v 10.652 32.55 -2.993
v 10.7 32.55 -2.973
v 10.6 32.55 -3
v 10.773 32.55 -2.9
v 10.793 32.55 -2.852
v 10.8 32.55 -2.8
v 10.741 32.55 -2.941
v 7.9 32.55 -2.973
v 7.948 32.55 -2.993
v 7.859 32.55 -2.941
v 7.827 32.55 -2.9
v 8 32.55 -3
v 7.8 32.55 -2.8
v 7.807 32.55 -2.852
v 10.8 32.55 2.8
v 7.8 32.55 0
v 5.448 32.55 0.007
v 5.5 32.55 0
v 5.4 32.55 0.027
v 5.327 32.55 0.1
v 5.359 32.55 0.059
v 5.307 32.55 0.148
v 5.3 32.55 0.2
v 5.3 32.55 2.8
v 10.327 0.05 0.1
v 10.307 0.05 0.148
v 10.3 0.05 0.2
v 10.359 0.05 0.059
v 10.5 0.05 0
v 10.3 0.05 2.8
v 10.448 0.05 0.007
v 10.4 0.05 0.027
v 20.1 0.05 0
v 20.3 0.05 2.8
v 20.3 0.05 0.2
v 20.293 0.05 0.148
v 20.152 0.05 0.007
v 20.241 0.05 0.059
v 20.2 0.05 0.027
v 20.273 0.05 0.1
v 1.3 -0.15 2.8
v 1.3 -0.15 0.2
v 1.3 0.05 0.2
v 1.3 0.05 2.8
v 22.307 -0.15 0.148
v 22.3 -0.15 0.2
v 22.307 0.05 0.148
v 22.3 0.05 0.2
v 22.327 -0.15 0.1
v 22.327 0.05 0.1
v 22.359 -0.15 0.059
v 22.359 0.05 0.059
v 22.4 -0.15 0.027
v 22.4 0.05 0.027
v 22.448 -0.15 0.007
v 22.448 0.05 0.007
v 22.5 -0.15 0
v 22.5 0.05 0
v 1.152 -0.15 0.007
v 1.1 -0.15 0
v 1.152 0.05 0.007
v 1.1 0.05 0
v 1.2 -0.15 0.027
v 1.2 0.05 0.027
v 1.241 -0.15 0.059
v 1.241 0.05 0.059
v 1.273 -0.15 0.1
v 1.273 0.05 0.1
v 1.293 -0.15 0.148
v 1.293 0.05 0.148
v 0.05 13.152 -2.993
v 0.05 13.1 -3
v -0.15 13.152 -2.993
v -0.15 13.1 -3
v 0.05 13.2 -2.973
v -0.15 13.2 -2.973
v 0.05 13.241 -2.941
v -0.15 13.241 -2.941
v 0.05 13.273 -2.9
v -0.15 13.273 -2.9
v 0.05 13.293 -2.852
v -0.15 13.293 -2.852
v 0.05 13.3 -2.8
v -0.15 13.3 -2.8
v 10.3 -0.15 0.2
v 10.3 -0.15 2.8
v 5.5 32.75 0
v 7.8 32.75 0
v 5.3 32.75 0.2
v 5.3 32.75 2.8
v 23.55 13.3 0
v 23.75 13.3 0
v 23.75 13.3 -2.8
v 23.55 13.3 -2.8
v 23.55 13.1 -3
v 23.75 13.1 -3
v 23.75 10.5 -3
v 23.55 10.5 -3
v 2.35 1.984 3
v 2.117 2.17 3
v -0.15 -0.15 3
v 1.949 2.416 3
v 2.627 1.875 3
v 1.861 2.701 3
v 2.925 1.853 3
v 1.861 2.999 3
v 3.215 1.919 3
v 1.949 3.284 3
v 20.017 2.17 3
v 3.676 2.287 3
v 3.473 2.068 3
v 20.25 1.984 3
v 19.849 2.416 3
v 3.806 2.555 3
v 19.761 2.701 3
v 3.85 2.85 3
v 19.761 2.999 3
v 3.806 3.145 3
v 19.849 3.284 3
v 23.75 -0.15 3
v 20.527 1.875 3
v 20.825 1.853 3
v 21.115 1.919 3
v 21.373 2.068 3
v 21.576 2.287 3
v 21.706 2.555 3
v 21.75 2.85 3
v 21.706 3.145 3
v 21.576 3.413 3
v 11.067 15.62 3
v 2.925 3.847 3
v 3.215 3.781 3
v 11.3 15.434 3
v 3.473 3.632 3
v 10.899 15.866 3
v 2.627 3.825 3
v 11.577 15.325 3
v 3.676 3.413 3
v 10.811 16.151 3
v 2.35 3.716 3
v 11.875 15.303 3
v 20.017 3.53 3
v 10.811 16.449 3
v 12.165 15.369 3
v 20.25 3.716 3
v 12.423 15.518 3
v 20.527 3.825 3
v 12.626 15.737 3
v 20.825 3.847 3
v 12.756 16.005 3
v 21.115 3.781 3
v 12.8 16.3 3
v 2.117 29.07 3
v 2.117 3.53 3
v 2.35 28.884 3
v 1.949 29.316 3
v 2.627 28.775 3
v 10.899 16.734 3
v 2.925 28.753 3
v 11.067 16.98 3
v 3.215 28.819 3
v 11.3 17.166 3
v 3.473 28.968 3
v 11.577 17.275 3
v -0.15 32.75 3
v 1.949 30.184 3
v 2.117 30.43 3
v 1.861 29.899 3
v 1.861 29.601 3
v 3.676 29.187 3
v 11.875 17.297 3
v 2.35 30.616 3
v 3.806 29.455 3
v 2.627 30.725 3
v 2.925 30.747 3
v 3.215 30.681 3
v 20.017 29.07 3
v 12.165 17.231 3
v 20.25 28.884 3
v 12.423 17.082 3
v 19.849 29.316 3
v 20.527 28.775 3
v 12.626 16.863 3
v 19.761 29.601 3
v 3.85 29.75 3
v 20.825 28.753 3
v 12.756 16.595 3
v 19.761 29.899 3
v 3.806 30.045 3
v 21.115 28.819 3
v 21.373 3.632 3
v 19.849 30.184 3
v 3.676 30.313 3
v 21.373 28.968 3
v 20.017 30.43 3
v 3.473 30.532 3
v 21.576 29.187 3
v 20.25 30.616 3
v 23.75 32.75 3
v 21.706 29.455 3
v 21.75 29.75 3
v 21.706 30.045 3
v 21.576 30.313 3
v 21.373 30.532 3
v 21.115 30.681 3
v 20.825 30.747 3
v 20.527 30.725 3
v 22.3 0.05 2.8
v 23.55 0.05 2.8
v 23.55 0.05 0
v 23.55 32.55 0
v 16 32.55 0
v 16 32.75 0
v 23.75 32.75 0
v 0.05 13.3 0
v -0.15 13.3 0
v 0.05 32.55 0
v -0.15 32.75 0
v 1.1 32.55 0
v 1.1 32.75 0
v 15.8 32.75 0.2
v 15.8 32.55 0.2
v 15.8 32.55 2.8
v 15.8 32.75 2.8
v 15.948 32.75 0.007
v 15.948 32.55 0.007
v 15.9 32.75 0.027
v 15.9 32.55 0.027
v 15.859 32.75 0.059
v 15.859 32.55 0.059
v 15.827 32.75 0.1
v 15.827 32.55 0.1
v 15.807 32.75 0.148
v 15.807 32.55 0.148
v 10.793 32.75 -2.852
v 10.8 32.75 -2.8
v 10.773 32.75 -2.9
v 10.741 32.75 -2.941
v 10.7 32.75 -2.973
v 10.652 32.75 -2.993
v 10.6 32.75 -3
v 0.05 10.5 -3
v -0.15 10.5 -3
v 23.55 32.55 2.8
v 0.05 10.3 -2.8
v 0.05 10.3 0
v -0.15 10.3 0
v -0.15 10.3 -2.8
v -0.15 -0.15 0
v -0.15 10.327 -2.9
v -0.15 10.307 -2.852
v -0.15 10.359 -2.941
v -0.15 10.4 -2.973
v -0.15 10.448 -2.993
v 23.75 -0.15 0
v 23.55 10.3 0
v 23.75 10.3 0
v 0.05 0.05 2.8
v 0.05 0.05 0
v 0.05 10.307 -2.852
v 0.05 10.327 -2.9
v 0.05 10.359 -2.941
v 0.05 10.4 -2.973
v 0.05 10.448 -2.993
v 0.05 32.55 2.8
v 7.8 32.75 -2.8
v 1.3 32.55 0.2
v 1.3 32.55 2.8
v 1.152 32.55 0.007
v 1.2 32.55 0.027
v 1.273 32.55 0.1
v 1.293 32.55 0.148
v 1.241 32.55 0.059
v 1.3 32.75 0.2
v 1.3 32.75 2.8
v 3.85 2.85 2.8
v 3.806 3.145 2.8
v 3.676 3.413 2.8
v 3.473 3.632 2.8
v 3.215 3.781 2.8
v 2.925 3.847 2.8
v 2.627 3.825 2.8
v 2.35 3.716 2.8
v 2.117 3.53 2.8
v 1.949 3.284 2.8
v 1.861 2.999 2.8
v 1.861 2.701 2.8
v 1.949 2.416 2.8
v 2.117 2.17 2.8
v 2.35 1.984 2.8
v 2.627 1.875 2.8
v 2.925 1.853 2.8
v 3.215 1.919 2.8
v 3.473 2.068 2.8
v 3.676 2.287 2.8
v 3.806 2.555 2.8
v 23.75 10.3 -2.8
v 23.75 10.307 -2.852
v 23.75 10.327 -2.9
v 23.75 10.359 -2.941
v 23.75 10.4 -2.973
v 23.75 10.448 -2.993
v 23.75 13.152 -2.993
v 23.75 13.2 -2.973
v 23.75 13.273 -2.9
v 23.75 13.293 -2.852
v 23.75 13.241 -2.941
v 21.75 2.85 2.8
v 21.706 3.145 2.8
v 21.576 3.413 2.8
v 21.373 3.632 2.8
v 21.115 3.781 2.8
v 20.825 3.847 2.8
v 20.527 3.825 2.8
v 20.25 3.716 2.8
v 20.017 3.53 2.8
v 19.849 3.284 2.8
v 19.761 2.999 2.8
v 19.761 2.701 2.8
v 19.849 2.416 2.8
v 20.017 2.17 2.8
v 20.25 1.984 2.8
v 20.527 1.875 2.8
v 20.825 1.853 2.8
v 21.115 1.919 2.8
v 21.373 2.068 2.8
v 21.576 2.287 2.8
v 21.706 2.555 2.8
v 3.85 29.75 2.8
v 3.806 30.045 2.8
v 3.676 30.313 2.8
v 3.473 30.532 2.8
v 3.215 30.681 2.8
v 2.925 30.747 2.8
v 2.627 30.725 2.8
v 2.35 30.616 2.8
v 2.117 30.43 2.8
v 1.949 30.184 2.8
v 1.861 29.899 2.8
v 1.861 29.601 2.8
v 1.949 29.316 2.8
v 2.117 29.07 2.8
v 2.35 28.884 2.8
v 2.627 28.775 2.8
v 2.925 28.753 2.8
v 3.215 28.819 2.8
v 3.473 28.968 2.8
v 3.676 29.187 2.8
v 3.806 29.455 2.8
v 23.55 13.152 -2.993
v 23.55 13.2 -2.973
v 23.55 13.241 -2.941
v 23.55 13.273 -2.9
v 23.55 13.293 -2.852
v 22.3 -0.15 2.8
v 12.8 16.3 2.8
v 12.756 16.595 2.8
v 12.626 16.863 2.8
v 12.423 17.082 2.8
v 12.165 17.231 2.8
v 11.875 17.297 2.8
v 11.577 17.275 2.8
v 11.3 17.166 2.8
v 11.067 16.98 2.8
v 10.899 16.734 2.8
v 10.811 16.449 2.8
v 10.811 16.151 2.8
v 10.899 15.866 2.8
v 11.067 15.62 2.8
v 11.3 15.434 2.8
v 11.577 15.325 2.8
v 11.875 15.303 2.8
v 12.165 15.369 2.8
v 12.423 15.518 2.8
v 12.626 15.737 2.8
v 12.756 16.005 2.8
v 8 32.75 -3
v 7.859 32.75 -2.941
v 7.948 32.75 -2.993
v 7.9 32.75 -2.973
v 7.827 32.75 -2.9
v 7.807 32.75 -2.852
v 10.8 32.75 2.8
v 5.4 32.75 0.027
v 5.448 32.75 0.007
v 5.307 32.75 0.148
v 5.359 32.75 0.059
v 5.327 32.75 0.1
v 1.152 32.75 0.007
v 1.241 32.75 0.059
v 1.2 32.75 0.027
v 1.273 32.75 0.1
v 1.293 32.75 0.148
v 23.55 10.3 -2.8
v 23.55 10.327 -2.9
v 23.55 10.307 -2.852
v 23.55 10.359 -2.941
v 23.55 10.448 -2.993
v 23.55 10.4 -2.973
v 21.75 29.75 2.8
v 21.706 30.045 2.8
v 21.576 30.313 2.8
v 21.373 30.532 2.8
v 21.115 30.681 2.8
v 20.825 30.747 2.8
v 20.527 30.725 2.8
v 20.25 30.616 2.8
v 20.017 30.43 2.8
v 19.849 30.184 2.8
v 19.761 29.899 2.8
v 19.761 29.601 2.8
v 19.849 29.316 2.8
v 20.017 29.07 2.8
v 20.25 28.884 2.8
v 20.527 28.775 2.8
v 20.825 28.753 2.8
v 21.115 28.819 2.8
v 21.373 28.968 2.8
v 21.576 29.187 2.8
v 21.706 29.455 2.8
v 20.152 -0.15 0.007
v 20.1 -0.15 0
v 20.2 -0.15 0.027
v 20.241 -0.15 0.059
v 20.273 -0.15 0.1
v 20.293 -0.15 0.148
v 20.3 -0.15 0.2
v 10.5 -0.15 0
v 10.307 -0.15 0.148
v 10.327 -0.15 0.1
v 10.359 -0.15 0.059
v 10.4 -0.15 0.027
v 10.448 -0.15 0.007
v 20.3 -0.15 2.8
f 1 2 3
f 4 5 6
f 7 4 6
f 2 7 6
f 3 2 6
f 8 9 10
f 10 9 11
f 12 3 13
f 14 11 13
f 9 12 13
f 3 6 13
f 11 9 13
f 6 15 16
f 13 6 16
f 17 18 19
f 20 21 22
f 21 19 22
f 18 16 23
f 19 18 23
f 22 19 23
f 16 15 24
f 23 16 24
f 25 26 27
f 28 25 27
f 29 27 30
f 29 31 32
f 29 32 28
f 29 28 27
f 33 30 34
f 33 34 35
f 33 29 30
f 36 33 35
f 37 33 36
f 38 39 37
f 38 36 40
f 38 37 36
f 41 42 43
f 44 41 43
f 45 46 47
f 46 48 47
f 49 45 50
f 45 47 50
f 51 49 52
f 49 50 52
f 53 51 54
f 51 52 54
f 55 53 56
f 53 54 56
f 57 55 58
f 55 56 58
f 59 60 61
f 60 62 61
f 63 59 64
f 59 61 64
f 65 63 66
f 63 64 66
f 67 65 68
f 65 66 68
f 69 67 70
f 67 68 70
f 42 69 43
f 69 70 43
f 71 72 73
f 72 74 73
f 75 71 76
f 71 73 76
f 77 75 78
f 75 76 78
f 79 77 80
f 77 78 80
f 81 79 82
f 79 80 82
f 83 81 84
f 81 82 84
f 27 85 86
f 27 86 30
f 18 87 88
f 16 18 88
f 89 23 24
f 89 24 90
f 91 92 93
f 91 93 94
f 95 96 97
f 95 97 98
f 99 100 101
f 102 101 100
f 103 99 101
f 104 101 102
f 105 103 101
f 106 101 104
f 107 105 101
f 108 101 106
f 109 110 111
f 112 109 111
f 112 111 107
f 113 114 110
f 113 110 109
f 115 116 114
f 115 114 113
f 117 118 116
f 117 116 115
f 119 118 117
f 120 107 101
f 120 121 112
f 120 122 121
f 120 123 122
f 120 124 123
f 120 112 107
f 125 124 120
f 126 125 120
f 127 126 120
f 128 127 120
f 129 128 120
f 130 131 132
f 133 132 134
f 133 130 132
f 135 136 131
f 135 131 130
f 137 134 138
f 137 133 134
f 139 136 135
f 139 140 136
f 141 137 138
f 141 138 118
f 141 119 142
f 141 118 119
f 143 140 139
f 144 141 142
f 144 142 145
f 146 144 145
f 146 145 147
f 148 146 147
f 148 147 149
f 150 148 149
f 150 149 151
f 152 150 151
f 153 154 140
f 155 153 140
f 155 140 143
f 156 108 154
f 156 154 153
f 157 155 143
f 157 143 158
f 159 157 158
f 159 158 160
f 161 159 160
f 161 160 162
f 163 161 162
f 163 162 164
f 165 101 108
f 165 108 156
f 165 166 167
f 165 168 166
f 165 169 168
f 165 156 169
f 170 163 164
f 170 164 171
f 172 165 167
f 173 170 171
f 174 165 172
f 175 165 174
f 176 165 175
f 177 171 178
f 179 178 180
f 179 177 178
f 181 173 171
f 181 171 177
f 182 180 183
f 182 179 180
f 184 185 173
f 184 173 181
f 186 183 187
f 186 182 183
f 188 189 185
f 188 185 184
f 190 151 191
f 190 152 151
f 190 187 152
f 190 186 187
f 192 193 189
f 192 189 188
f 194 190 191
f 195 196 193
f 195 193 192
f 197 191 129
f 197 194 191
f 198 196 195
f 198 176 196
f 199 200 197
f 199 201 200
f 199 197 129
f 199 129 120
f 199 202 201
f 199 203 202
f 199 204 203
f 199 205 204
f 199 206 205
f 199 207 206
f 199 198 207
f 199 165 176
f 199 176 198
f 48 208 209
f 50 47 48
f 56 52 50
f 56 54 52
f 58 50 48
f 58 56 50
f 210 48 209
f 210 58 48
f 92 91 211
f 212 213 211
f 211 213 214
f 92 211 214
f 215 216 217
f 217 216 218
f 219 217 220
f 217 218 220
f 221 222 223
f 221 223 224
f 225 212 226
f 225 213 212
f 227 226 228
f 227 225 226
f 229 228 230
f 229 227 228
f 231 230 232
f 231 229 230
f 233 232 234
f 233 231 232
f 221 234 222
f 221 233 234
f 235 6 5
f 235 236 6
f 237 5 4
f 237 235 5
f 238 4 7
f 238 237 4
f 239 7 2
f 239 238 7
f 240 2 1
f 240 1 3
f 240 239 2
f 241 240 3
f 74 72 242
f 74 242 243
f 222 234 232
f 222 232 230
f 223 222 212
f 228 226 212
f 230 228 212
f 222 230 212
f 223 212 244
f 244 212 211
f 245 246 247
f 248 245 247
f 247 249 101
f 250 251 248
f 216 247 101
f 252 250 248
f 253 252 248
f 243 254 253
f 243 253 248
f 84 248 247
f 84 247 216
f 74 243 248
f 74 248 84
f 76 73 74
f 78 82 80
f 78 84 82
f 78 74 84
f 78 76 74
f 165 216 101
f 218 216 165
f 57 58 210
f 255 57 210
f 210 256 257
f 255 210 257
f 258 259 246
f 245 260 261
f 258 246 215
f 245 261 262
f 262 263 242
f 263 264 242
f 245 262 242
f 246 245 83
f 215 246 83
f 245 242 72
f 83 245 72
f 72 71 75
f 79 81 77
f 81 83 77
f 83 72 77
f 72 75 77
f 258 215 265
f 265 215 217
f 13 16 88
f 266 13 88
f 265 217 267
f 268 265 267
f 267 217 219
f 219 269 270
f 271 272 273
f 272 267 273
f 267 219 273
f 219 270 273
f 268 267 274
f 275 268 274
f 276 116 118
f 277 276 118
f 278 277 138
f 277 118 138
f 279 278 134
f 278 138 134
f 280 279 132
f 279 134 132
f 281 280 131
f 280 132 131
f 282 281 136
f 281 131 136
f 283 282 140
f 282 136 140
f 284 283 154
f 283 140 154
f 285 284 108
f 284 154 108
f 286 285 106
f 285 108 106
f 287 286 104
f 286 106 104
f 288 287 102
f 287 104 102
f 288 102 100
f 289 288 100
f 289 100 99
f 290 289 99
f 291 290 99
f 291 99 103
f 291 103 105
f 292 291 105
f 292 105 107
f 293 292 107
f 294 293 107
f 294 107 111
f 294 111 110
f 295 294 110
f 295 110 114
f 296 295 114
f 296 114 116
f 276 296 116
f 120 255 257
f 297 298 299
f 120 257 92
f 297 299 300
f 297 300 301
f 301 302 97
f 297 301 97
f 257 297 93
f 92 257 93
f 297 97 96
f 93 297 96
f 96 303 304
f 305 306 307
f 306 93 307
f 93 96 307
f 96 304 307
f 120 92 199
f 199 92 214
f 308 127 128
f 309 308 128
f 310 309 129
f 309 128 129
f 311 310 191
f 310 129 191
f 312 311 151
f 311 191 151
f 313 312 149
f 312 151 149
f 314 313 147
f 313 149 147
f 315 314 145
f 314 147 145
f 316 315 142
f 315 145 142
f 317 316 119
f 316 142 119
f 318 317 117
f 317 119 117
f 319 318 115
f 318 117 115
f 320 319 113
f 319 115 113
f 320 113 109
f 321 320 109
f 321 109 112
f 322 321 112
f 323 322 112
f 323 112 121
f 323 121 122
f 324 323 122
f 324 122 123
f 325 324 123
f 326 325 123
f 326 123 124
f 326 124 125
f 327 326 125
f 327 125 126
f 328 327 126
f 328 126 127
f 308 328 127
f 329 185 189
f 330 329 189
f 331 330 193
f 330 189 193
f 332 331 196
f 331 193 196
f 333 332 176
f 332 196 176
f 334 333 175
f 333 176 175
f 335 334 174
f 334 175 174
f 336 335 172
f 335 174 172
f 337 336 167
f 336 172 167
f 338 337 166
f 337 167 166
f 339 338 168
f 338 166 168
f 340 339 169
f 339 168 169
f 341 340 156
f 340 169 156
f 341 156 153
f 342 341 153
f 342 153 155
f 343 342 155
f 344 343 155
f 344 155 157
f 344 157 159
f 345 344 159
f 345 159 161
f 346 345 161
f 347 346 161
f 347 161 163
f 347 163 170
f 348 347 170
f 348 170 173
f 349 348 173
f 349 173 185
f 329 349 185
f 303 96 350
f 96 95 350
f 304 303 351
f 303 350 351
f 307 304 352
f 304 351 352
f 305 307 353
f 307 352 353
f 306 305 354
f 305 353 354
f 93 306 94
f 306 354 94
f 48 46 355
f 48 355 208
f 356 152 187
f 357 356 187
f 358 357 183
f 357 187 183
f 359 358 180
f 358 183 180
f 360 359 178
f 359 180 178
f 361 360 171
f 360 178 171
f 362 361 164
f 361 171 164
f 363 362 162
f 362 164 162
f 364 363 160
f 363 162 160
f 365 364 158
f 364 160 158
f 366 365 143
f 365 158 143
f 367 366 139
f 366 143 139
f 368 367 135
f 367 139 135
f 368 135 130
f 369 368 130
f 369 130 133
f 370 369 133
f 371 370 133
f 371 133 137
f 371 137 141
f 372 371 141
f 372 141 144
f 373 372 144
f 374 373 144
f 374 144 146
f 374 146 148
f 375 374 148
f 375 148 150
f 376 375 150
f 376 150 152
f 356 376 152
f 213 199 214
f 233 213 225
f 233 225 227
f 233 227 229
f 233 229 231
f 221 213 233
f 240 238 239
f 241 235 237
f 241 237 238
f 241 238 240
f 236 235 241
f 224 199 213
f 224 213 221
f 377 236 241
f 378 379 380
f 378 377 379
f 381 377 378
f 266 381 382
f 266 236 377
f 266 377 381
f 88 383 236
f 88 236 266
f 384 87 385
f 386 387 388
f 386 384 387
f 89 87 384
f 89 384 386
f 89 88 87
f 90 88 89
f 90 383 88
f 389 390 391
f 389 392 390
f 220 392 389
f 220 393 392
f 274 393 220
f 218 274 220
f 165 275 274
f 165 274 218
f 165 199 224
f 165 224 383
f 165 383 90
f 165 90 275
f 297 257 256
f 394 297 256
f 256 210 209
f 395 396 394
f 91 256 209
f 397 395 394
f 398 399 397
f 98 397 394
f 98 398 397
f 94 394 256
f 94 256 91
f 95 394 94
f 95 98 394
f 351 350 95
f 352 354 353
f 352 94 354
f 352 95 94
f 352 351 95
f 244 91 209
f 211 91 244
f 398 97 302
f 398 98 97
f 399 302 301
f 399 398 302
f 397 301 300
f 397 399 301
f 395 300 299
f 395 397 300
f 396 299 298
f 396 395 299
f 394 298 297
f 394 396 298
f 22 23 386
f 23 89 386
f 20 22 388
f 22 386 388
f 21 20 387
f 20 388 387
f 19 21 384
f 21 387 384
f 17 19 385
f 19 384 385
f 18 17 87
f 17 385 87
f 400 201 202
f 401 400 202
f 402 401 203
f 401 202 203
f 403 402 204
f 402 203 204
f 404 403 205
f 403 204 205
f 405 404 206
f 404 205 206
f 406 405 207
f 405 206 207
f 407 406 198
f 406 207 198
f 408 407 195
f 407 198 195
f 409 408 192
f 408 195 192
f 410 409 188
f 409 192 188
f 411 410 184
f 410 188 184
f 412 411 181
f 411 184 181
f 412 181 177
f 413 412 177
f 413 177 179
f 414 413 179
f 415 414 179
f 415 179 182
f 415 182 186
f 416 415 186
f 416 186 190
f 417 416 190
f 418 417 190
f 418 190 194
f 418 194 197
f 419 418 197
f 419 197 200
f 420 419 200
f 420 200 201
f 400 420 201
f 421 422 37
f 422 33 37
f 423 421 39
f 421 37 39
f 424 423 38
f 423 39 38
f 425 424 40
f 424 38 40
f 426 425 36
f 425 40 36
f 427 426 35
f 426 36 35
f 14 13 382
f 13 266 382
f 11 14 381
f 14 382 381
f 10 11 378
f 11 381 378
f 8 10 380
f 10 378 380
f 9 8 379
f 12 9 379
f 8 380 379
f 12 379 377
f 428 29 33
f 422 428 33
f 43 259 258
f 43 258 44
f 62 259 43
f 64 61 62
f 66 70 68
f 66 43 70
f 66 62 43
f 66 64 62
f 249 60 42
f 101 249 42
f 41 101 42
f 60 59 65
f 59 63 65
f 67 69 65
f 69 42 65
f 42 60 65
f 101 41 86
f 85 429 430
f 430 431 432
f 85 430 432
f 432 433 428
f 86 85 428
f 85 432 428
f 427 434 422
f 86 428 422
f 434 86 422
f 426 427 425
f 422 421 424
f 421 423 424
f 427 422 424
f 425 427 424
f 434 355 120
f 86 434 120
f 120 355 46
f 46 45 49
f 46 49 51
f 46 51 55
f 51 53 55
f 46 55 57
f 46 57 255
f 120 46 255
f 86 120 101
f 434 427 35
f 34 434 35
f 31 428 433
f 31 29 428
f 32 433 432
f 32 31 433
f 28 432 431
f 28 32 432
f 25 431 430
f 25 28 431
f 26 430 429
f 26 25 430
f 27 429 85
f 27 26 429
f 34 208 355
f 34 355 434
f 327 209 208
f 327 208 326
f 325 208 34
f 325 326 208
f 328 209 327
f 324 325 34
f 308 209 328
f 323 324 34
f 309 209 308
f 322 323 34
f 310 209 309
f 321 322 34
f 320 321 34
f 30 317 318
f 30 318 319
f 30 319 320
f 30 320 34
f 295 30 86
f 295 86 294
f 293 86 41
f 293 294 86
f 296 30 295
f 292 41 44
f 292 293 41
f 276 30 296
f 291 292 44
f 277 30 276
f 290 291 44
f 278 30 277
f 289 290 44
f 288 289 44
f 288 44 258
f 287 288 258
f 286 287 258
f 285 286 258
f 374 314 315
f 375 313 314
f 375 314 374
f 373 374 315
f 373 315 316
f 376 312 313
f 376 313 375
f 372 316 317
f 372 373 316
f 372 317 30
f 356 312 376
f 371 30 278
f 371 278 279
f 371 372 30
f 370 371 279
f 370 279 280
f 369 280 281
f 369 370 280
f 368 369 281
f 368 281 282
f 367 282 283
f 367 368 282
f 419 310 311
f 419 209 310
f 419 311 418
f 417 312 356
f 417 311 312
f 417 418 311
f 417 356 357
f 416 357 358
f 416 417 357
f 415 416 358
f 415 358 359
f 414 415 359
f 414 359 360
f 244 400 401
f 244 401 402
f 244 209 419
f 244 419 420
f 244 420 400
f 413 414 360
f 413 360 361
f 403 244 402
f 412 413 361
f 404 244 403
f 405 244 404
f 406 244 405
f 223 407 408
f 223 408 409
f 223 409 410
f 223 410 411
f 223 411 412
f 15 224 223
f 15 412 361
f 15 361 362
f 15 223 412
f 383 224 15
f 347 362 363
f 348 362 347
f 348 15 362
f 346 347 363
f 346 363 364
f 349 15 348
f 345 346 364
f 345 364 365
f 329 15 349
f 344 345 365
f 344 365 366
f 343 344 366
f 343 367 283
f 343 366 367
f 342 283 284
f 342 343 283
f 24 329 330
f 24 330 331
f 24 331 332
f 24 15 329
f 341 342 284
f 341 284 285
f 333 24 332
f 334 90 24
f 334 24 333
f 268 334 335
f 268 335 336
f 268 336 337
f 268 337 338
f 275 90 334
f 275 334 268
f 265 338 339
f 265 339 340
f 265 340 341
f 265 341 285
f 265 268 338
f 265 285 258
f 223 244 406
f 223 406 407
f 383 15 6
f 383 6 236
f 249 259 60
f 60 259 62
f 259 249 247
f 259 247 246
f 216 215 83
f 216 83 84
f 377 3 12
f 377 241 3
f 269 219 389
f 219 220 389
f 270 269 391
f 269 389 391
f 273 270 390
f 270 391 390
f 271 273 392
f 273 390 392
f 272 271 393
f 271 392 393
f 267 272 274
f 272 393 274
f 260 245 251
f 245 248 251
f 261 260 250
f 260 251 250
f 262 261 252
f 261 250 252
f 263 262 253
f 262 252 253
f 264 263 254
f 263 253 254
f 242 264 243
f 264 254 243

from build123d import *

# Parameters (mm, degrees)
SKETCH_1_W          = 23.9
SKETCH_1_H          = 32.9
EXTRUDE_1_DEPTH     = 3
SHELL_1_T           = -0.2
SKETCH_3_2_W        = 9
SKETCH_3_2_H        = 0.2
SKETCH_3_2_W_2      = 2
SKETCH_3_2_W_3      = 5
SKETCH_3_2_W_4      = 4
CUT_EXTRUDE_3_DEPTH = 2.8
SKETCH_3_W          = 3
SKETCH_3_H          = 0.2
SKETCH_3_W_2        = 0.2
SKETCH_3_H_2        = 3
EXTRUDE_2_DEPTH     = 3
FILLET_1_R          = 0.2
SKETCH_5_R          = 1
CUT_EXTRUDE_5_DEPTH = 7


with BuildPart() as part:
    # Sketch 1 → Extrude 1 (new body)
    with BuildSketch(Plane.XY):
        with Locations((11.8, 16.3)):
            Rectangle(SKETCH_1_W, SKETCH_1_H)
    extrude(amount=EXTRUDE_1_DEPTH)

    # Shell 1
    shell_1_openings = [part.faces().sort_by_distance(p)[0] for p in [
        (11.8, 16.3, 0),
    ]]
    offset(amount=SHELL_1_T, openings=shell_1_openings, kind=Kind.INTERSECTION)

    # Sketch 3_2 → Cut-Extrude 3 (cut)
    with BuildSketch(Plane(origin=(0, 0, 0), x_dir=(-1, 0, 0), z_dir=(0, 0, -1))):
        with Locations((-5.8, -0.05)):
            Rectangle(SKETCH_3_2_W, SKETCH_3_2_H)
        with Locations((-21.3, -0.05)):
            Rectangle(SKETCH_3_2_W_2, SKETCH_3_2_H)
        with Locations((-13.3, 32.65)):
            Rectangle(SKETCH_3_2_W_3, SKETCH_3_2_H)
        with Locations((-3.3, 32.65)):
            Rectangle(SKETCH_3_2_W_4, SKETCH_3_2_H)
    extrude(amount=-CUT_EXTRUDE_3_DEPTH, mode=Mode.SUBTRACT)

    # Sketch 3 → Extrude 2 (add)
    with BuildSketch(Plane(origin=(0, 0, 0), x_dir=(-1, 0, 0), z_dir=(0, 0, -1))):
        with Locations((-9.3, 32.65)):
            Rectangle(SKETCH_3_W, SKETCH_3_H)
        with Locations((0.05, 11.8)):
            Rectangle(SKETCH_3_W_2, SKETCH_3_H_2)
        with Locations((-23.65, 11.8)):
            Rectangle(SKETCH_3_W_2, SKETCH_3_H_2)
    extrude(amount=EXTRUDE_2_DEPTH)

    # Fillet 1
    fillet_1_edges = [part.edges().sort_by_distance(p)[0] for p in [
        (-0.05, 13.3, -3),
        (-0.05, 10.3, -3),
        (23.65, 13.3, -3),
        (23.65, 10.3, -3),
        (1.3, -0.05, 0),
        (10.3, -0.05, 0),
        (20.3, -0.05, 0),
        (22.3, -0.05, 0),
        (15.8, 32.65, 0),
        (1.3, 32.65, 0),
        (5.3, 32.65, 0),
        (7.8, 32.65, -3),
        (10.8, 32.65, -3),
    ]]
    fillet(fillet_1_edges, radius=FILLET_1_R)

    # Sketch 5 → Cut-Extrude 5 (cut, through all)
    with BuildSketch(Plane.XY.offset(3)):
        with Locations((11.8, 16.3)):
            Circle(SKETCH_5_R)
        with Locations((2.85, 29.75)):
            Circle(SKETCH_5_R)
        with Locations((2.85, 2.85)):
            Circle(SKETCH_5_R)
        with Locations((20.75, 2.85)):
            Circle(SKETCH_5_R)
        with Locations((20.75, 29.75)):
            Circle(SKETCH_5_R)
    extrude(amount=-CUT_EXTRUDE_5_DEPTH, mode=Mode.SUBTRACT)


solid = part.part
